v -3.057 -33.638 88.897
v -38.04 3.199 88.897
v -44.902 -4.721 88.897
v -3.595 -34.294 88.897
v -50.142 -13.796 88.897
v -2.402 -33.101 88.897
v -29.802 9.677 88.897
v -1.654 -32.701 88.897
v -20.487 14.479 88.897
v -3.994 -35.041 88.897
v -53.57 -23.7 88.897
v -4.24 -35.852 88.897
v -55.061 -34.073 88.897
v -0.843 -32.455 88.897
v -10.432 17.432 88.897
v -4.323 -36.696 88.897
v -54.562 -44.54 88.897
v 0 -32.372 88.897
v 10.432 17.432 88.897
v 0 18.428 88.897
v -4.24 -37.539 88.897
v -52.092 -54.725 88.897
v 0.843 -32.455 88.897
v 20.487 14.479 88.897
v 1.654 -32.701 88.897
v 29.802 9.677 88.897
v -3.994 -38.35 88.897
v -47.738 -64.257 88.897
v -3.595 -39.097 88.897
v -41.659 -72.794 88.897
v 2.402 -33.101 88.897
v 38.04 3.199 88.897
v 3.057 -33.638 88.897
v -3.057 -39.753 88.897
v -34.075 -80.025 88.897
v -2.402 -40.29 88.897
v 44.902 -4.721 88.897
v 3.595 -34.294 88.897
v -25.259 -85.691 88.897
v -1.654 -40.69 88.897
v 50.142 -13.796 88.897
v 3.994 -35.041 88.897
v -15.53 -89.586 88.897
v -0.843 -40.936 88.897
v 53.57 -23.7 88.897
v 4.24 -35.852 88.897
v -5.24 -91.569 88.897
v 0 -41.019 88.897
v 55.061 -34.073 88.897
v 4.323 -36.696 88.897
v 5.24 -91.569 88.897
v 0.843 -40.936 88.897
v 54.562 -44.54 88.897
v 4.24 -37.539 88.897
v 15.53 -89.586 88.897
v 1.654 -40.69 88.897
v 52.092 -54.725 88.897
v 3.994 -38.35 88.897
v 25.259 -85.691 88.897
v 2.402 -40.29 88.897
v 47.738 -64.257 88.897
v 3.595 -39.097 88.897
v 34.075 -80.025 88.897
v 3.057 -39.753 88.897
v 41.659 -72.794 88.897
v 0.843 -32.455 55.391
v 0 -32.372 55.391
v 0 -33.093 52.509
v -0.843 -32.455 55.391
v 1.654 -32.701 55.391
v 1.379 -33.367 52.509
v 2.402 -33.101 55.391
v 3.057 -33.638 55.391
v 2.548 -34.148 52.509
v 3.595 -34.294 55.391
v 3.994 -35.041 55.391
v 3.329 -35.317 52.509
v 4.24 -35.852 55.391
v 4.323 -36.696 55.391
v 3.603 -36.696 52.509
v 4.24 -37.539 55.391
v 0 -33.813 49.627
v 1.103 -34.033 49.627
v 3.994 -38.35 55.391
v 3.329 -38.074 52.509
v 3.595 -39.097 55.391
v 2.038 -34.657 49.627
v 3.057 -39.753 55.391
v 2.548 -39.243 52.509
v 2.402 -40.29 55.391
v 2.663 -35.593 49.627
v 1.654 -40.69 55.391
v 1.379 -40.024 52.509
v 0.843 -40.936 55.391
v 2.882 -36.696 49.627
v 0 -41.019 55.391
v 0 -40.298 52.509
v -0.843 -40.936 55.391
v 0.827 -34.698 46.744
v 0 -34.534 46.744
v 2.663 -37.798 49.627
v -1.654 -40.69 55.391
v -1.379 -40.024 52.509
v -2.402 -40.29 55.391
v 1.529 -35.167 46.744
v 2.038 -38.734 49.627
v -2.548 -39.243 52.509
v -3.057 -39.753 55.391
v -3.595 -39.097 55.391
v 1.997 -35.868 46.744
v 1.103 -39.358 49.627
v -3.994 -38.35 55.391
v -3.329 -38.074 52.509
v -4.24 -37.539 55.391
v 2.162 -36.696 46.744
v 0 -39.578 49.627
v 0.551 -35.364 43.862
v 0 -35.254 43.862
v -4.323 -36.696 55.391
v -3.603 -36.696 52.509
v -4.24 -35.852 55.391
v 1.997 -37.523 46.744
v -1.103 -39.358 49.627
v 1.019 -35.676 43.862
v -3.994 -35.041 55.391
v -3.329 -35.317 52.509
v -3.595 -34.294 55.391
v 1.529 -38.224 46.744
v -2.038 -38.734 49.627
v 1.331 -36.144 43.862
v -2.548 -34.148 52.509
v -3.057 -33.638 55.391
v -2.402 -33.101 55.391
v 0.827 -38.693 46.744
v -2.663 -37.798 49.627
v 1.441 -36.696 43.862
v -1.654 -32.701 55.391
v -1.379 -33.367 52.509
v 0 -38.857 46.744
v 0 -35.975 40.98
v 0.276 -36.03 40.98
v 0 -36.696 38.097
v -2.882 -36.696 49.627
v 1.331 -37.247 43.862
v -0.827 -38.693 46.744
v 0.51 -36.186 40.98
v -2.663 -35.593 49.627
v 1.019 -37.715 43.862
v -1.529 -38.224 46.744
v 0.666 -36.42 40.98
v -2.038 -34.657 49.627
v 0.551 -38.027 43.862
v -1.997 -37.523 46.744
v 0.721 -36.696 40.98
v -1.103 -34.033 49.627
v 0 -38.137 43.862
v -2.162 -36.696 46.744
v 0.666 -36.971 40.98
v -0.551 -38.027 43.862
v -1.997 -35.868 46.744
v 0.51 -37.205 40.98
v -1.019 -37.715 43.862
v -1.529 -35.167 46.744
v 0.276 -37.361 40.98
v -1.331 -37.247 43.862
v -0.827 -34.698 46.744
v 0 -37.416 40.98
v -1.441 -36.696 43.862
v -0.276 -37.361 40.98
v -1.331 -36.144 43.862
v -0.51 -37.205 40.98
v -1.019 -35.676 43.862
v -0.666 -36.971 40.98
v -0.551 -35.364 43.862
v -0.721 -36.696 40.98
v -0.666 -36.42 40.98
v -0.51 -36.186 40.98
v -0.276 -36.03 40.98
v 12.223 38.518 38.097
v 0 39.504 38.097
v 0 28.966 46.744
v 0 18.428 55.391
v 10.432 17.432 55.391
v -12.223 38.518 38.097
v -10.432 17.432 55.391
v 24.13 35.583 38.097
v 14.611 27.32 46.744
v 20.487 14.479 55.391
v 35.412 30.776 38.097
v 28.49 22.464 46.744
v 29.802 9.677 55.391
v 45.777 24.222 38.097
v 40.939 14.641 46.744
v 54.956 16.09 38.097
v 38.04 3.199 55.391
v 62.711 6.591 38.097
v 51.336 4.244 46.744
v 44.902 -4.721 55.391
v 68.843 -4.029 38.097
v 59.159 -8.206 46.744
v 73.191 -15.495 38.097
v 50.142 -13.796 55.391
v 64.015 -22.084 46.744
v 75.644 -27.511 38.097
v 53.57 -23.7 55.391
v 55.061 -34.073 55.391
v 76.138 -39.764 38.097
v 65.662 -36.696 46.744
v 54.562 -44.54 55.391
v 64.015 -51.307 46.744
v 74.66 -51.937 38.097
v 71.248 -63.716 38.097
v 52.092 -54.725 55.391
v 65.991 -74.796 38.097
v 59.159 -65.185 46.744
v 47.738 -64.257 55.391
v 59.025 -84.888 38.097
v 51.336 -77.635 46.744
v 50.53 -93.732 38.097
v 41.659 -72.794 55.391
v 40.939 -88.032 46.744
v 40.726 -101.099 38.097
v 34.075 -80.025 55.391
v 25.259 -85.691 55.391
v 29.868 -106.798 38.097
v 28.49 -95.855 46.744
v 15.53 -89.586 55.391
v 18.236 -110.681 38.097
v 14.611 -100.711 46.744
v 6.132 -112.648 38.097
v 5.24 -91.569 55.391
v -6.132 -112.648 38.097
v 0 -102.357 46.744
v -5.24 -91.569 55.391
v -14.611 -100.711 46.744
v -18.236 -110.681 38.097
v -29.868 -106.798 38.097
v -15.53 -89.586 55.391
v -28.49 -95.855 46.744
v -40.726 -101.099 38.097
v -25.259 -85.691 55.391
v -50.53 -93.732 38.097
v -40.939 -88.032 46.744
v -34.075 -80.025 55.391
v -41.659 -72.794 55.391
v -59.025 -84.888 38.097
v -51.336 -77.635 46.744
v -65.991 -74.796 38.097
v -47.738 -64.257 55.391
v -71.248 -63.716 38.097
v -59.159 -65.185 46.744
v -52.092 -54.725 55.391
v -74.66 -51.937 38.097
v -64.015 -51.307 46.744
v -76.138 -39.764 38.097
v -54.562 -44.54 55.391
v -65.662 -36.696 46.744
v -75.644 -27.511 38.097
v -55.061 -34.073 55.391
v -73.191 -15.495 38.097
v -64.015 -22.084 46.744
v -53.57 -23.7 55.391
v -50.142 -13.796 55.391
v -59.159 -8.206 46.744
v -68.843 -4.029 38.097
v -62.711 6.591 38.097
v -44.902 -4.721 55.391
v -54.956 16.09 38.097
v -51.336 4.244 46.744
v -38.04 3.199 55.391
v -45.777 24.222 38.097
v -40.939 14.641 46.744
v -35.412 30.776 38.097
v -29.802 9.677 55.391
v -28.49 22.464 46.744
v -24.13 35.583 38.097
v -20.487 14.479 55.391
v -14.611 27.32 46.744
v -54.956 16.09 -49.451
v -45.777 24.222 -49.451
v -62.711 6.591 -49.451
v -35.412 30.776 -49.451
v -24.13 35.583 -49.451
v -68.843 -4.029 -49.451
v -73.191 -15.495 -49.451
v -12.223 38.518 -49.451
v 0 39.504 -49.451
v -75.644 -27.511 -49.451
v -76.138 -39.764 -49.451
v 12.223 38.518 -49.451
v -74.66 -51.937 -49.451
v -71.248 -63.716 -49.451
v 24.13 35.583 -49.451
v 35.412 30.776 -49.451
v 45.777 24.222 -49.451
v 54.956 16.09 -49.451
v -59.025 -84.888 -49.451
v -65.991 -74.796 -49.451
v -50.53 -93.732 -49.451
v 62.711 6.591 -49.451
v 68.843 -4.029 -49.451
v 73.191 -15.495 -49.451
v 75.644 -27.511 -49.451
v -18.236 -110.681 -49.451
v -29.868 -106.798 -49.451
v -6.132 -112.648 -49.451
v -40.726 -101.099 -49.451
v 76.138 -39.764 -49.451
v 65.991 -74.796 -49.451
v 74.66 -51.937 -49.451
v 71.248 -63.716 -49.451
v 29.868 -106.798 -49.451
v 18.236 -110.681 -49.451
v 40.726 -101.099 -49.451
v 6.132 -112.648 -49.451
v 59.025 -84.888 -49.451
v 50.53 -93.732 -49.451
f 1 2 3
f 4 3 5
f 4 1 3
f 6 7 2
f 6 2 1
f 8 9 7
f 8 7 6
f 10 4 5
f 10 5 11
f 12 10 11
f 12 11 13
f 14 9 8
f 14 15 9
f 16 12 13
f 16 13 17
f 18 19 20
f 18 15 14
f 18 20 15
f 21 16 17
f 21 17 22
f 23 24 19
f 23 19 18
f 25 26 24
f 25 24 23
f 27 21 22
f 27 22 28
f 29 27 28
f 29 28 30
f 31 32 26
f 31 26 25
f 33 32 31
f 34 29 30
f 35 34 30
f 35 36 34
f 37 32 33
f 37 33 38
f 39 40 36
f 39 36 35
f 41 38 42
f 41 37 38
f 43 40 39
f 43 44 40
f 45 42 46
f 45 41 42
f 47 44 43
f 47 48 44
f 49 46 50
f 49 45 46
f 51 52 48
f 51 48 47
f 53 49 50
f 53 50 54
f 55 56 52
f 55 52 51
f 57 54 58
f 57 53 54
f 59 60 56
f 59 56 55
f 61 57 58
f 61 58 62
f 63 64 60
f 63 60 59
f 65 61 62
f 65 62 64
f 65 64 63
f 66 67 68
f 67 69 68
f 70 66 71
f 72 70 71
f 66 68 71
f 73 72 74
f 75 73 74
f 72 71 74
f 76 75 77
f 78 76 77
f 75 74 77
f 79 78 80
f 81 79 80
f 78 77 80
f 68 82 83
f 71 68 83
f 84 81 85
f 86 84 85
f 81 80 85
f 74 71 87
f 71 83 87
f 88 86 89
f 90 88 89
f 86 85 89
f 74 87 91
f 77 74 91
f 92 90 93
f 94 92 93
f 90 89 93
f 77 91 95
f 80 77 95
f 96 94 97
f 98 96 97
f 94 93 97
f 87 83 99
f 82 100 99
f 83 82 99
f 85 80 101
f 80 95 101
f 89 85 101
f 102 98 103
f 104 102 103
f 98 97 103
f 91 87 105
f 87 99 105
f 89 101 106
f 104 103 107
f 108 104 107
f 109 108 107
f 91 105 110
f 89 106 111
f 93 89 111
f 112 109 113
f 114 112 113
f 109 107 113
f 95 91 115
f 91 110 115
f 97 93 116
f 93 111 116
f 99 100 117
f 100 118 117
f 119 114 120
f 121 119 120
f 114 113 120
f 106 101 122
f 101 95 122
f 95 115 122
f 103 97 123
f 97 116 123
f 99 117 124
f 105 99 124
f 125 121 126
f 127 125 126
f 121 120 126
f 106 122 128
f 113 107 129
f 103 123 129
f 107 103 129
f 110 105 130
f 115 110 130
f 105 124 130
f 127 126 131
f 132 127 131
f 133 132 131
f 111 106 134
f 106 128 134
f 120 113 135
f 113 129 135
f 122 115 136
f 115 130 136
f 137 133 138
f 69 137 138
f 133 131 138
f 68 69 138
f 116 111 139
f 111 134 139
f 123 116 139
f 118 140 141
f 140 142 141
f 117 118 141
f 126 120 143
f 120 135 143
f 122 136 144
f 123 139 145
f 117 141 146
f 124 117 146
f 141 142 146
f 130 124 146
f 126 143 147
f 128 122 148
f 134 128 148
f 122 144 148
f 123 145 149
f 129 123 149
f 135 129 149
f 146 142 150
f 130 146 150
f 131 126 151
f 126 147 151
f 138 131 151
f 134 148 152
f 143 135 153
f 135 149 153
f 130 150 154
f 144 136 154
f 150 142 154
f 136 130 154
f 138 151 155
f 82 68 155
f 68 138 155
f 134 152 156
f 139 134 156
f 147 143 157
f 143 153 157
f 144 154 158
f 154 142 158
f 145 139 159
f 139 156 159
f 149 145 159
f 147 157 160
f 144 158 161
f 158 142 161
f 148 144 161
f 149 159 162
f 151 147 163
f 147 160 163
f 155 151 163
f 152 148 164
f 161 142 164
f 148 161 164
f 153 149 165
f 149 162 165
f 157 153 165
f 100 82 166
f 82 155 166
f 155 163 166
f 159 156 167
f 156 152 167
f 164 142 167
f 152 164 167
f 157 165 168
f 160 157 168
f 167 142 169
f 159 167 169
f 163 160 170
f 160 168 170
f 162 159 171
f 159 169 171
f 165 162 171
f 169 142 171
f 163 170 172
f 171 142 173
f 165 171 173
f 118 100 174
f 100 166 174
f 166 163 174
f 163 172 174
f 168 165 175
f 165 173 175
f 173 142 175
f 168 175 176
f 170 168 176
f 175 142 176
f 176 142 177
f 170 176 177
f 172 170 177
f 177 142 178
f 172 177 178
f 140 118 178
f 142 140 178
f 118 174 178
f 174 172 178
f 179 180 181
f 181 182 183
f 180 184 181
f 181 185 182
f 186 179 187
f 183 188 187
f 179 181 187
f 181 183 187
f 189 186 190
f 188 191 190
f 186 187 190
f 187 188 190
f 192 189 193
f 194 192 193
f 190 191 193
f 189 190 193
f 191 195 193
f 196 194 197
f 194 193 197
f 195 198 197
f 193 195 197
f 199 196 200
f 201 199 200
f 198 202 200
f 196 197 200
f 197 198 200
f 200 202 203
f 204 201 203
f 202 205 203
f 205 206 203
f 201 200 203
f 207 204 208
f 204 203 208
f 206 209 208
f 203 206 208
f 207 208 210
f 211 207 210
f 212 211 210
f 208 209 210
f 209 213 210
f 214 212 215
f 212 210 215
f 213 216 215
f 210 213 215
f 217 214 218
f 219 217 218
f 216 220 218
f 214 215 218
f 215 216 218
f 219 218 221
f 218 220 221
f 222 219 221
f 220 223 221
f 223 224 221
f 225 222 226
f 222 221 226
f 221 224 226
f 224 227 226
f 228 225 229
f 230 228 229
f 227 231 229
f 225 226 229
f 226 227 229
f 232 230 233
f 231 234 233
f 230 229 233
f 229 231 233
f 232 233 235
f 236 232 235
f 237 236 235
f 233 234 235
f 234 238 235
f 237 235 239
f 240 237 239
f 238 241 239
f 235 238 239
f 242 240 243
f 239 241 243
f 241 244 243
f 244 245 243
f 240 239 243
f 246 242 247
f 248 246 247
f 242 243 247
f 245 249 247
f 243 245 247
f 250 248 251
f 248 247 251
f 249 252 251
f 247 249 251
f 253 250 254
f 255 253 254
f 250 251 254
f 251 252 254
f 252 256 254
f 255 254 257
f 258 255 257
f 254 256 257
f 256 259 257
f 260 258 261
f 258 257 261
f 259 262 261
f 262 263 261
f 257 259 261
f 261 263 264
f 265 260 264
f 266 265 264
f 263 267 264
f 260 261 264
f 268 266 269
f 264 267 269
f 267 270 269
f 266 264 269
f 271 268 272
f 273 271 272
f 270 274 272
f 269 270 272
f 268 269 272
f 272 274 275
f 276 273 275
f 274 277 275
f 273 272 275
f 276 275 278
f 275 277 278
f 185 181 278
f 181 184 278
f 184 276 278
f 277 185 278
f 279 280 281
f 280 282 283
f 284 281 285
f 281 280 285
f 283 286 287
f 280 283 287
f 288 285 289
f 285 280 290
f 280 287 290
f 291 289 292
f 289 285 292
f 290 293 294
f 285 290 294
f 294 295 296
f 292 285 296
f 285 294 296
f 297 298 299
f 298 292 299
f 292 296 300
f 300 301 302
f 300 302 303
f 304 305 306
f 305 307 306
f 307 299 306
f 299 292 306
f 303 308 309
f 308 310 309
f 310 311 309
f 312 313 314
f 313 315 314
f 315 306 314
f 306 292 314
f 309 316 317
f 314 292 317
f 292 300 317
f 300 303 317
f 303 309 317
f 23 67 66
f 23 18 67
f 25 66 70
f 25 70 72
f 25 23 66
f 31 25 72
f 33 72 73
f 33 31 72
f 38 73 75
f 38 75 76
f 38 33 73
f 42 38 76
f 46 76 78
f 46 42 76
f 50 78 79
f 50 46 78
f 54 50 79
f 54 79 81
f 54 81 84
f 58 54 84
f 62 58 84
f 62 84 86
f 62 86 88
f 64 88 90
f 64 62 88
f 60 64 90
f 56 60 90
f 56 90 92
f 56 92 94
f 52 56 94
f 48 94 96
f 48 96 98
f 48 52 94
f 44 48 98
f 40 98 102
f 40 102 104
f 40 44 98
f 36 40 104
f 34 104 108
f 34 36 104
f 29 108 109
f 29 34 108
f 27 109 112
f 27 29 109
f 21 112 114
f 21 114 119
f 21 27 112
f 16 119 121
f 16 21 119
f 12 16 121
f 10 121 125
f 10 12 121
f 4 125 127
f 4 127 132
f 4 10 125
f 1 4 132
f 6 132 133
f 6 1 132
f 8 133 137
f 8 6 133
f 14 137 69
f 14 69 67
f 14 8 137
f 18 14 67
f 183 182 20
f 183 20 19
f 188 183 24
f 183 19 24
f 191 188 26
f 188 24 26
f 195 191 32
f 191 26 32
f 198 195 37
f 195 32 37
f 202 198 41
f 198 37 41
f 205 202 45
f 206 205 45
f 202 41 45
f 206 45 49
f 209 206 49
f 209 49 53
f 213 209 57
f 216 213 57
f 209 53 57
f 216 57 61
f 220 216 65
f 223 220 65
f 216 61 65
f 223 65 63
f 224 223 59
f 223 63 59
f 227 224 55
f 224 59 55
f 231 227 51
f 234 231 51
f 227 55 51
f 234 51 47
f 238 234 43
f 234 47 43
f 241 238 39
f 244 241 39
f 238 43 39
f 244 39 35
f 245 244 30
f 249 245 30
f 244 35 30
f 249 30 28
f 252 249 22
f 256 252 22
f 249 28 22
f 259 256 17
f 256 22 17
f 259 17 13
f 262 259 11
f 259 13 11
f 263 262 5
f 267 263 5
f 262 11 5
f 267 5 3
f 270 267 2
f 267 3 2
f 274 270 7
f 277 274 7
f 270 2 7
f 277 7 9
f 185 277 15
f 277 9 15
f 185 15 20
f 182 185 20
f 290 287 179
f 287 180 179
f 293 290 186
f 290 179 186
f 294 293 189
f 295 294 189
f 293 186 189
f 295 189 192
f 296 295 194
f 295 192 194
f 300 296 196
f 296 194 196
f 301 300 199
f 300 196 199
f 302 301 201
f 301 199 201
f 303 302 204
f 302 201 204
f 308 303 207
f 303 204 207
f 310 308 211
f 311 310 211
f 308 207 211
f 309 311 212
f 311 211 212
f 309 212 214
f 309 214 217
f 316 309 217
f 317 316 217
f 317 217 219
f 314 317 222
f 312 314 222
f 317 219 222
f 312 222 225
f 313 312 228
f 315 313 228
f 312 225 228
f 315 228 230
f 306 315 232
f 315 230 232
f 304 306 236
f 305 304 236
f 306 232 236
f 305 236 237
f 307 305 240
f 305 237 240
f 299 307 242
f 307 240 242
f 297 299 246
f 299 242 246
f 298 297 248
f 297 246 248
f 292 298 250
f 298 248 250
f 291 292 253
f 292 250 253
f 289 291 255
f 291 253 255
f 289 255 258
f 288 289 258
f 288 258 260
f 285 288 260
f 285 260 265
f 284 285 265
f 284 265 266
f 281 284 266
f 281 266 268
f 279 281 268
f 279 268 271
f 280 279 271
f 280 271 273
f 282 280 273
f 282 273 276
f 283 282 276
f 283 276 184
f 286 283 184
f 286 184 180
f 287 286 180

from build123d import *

# Parameters (mm, degrees)
F0_W   = 50.8
F0_H   = 33.506379
F0_W_2 = 76.2
F0_H_2 = 87.548942


with BuildPart() as f1:
    # F0 (on Right) → F1 (revolve)
    with BuildSketch(Plane.YZ):
        with Locations((-6.972096, 72.144307)):
            Rectangle(F0_W, F0_H)
        with Locations((1.404499, -5.676974)):
            Rectangle(F0_W_2, F0_H_2)
        Polygon((-32.372096, 55.391118), (-36.695501, 38.097497), (39.504499, 38.097497), (18.427904, 55.391118), align=None)
    revolve(axis=Axis((0, -36.695501, -5.676974), (0, 0, -1)))


solid = f1.part
